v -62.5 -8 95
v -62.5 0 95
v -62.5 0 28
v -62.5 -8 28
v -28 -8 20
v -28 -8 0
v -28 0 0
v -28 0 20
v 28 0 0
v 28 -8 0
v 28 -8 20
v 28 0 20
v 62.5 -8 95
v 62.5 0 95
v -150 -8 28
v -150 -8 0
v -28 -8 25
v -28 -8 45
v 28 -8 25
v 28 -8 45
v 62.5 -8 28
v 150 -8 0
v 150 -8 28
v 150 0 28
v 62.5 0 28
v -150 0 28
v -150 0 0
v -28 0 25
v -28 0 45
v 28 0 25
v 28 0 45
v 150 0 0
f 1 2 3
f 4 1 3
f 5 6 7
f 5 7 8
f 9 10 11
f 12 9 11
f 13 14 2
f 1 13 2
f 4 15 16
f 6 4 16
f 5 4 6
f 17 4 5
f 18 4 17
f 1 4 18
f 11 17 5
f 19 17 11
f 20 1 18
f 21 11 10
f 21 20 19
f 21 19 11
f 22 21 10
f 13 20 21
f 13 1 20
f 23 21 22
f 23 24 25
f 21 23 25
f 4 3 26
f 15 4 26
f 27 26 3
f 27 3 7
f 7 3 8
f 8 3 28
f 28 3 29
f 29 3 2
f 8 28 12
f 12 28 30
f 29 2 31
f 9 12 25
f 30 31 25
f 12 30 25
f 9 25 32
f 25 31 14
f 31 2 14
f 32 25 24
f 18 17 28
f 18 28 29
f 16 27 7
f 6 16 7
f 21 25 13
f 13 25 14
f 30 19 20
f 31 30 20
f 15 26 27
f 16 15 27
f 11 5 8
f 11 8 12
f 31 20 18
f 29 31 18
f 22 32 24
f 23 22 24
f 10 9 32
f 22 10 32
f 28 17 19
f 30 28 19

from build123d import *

# Parameters (mm, degrees)
F1_DEPTH = 8
F2_W     = 56
F2_H     = 20
F3_DEPTH = 25
F5_W     = 28
F5_H     = 20
F6_DEPTH = 25


with BuildPart() as f1:
    # F0 (on Front) → F1 (new body)
    with BuildSketch(Plane.XZ):
        Polygon((-150, 0), (0, 0), (150, 0), (150, 28), (62.5, 28), (62.5, 95), (-62.5, 95), (-62.5, 28), (-150, 28), align=None)
    extrude(amount=F1_DEPTH)

    # F2 (on face) → F3 (cut)
    with BuildSketch(Plane.XZ.offset(8)):
        with Locations((0, 10)):
            Rectangle(F2_W, F2_H)
    extrude(amount=-F3_DEPTH, mode=Mode.SUBTRACT)

    # F5 (on face) → F6 (cut)
    with BuildSketch(Plane.XZ.offset(8)):
        with Locations((-14, 35)):
            Rectangle(F5_W, F5_H)
        with Locations((14, 35)):
            Rectangle(F5_W, F5_H)
    extrude(amount=-F6_DEPTH, mode=Mode.SUBTRACT)


solid = f1.part
